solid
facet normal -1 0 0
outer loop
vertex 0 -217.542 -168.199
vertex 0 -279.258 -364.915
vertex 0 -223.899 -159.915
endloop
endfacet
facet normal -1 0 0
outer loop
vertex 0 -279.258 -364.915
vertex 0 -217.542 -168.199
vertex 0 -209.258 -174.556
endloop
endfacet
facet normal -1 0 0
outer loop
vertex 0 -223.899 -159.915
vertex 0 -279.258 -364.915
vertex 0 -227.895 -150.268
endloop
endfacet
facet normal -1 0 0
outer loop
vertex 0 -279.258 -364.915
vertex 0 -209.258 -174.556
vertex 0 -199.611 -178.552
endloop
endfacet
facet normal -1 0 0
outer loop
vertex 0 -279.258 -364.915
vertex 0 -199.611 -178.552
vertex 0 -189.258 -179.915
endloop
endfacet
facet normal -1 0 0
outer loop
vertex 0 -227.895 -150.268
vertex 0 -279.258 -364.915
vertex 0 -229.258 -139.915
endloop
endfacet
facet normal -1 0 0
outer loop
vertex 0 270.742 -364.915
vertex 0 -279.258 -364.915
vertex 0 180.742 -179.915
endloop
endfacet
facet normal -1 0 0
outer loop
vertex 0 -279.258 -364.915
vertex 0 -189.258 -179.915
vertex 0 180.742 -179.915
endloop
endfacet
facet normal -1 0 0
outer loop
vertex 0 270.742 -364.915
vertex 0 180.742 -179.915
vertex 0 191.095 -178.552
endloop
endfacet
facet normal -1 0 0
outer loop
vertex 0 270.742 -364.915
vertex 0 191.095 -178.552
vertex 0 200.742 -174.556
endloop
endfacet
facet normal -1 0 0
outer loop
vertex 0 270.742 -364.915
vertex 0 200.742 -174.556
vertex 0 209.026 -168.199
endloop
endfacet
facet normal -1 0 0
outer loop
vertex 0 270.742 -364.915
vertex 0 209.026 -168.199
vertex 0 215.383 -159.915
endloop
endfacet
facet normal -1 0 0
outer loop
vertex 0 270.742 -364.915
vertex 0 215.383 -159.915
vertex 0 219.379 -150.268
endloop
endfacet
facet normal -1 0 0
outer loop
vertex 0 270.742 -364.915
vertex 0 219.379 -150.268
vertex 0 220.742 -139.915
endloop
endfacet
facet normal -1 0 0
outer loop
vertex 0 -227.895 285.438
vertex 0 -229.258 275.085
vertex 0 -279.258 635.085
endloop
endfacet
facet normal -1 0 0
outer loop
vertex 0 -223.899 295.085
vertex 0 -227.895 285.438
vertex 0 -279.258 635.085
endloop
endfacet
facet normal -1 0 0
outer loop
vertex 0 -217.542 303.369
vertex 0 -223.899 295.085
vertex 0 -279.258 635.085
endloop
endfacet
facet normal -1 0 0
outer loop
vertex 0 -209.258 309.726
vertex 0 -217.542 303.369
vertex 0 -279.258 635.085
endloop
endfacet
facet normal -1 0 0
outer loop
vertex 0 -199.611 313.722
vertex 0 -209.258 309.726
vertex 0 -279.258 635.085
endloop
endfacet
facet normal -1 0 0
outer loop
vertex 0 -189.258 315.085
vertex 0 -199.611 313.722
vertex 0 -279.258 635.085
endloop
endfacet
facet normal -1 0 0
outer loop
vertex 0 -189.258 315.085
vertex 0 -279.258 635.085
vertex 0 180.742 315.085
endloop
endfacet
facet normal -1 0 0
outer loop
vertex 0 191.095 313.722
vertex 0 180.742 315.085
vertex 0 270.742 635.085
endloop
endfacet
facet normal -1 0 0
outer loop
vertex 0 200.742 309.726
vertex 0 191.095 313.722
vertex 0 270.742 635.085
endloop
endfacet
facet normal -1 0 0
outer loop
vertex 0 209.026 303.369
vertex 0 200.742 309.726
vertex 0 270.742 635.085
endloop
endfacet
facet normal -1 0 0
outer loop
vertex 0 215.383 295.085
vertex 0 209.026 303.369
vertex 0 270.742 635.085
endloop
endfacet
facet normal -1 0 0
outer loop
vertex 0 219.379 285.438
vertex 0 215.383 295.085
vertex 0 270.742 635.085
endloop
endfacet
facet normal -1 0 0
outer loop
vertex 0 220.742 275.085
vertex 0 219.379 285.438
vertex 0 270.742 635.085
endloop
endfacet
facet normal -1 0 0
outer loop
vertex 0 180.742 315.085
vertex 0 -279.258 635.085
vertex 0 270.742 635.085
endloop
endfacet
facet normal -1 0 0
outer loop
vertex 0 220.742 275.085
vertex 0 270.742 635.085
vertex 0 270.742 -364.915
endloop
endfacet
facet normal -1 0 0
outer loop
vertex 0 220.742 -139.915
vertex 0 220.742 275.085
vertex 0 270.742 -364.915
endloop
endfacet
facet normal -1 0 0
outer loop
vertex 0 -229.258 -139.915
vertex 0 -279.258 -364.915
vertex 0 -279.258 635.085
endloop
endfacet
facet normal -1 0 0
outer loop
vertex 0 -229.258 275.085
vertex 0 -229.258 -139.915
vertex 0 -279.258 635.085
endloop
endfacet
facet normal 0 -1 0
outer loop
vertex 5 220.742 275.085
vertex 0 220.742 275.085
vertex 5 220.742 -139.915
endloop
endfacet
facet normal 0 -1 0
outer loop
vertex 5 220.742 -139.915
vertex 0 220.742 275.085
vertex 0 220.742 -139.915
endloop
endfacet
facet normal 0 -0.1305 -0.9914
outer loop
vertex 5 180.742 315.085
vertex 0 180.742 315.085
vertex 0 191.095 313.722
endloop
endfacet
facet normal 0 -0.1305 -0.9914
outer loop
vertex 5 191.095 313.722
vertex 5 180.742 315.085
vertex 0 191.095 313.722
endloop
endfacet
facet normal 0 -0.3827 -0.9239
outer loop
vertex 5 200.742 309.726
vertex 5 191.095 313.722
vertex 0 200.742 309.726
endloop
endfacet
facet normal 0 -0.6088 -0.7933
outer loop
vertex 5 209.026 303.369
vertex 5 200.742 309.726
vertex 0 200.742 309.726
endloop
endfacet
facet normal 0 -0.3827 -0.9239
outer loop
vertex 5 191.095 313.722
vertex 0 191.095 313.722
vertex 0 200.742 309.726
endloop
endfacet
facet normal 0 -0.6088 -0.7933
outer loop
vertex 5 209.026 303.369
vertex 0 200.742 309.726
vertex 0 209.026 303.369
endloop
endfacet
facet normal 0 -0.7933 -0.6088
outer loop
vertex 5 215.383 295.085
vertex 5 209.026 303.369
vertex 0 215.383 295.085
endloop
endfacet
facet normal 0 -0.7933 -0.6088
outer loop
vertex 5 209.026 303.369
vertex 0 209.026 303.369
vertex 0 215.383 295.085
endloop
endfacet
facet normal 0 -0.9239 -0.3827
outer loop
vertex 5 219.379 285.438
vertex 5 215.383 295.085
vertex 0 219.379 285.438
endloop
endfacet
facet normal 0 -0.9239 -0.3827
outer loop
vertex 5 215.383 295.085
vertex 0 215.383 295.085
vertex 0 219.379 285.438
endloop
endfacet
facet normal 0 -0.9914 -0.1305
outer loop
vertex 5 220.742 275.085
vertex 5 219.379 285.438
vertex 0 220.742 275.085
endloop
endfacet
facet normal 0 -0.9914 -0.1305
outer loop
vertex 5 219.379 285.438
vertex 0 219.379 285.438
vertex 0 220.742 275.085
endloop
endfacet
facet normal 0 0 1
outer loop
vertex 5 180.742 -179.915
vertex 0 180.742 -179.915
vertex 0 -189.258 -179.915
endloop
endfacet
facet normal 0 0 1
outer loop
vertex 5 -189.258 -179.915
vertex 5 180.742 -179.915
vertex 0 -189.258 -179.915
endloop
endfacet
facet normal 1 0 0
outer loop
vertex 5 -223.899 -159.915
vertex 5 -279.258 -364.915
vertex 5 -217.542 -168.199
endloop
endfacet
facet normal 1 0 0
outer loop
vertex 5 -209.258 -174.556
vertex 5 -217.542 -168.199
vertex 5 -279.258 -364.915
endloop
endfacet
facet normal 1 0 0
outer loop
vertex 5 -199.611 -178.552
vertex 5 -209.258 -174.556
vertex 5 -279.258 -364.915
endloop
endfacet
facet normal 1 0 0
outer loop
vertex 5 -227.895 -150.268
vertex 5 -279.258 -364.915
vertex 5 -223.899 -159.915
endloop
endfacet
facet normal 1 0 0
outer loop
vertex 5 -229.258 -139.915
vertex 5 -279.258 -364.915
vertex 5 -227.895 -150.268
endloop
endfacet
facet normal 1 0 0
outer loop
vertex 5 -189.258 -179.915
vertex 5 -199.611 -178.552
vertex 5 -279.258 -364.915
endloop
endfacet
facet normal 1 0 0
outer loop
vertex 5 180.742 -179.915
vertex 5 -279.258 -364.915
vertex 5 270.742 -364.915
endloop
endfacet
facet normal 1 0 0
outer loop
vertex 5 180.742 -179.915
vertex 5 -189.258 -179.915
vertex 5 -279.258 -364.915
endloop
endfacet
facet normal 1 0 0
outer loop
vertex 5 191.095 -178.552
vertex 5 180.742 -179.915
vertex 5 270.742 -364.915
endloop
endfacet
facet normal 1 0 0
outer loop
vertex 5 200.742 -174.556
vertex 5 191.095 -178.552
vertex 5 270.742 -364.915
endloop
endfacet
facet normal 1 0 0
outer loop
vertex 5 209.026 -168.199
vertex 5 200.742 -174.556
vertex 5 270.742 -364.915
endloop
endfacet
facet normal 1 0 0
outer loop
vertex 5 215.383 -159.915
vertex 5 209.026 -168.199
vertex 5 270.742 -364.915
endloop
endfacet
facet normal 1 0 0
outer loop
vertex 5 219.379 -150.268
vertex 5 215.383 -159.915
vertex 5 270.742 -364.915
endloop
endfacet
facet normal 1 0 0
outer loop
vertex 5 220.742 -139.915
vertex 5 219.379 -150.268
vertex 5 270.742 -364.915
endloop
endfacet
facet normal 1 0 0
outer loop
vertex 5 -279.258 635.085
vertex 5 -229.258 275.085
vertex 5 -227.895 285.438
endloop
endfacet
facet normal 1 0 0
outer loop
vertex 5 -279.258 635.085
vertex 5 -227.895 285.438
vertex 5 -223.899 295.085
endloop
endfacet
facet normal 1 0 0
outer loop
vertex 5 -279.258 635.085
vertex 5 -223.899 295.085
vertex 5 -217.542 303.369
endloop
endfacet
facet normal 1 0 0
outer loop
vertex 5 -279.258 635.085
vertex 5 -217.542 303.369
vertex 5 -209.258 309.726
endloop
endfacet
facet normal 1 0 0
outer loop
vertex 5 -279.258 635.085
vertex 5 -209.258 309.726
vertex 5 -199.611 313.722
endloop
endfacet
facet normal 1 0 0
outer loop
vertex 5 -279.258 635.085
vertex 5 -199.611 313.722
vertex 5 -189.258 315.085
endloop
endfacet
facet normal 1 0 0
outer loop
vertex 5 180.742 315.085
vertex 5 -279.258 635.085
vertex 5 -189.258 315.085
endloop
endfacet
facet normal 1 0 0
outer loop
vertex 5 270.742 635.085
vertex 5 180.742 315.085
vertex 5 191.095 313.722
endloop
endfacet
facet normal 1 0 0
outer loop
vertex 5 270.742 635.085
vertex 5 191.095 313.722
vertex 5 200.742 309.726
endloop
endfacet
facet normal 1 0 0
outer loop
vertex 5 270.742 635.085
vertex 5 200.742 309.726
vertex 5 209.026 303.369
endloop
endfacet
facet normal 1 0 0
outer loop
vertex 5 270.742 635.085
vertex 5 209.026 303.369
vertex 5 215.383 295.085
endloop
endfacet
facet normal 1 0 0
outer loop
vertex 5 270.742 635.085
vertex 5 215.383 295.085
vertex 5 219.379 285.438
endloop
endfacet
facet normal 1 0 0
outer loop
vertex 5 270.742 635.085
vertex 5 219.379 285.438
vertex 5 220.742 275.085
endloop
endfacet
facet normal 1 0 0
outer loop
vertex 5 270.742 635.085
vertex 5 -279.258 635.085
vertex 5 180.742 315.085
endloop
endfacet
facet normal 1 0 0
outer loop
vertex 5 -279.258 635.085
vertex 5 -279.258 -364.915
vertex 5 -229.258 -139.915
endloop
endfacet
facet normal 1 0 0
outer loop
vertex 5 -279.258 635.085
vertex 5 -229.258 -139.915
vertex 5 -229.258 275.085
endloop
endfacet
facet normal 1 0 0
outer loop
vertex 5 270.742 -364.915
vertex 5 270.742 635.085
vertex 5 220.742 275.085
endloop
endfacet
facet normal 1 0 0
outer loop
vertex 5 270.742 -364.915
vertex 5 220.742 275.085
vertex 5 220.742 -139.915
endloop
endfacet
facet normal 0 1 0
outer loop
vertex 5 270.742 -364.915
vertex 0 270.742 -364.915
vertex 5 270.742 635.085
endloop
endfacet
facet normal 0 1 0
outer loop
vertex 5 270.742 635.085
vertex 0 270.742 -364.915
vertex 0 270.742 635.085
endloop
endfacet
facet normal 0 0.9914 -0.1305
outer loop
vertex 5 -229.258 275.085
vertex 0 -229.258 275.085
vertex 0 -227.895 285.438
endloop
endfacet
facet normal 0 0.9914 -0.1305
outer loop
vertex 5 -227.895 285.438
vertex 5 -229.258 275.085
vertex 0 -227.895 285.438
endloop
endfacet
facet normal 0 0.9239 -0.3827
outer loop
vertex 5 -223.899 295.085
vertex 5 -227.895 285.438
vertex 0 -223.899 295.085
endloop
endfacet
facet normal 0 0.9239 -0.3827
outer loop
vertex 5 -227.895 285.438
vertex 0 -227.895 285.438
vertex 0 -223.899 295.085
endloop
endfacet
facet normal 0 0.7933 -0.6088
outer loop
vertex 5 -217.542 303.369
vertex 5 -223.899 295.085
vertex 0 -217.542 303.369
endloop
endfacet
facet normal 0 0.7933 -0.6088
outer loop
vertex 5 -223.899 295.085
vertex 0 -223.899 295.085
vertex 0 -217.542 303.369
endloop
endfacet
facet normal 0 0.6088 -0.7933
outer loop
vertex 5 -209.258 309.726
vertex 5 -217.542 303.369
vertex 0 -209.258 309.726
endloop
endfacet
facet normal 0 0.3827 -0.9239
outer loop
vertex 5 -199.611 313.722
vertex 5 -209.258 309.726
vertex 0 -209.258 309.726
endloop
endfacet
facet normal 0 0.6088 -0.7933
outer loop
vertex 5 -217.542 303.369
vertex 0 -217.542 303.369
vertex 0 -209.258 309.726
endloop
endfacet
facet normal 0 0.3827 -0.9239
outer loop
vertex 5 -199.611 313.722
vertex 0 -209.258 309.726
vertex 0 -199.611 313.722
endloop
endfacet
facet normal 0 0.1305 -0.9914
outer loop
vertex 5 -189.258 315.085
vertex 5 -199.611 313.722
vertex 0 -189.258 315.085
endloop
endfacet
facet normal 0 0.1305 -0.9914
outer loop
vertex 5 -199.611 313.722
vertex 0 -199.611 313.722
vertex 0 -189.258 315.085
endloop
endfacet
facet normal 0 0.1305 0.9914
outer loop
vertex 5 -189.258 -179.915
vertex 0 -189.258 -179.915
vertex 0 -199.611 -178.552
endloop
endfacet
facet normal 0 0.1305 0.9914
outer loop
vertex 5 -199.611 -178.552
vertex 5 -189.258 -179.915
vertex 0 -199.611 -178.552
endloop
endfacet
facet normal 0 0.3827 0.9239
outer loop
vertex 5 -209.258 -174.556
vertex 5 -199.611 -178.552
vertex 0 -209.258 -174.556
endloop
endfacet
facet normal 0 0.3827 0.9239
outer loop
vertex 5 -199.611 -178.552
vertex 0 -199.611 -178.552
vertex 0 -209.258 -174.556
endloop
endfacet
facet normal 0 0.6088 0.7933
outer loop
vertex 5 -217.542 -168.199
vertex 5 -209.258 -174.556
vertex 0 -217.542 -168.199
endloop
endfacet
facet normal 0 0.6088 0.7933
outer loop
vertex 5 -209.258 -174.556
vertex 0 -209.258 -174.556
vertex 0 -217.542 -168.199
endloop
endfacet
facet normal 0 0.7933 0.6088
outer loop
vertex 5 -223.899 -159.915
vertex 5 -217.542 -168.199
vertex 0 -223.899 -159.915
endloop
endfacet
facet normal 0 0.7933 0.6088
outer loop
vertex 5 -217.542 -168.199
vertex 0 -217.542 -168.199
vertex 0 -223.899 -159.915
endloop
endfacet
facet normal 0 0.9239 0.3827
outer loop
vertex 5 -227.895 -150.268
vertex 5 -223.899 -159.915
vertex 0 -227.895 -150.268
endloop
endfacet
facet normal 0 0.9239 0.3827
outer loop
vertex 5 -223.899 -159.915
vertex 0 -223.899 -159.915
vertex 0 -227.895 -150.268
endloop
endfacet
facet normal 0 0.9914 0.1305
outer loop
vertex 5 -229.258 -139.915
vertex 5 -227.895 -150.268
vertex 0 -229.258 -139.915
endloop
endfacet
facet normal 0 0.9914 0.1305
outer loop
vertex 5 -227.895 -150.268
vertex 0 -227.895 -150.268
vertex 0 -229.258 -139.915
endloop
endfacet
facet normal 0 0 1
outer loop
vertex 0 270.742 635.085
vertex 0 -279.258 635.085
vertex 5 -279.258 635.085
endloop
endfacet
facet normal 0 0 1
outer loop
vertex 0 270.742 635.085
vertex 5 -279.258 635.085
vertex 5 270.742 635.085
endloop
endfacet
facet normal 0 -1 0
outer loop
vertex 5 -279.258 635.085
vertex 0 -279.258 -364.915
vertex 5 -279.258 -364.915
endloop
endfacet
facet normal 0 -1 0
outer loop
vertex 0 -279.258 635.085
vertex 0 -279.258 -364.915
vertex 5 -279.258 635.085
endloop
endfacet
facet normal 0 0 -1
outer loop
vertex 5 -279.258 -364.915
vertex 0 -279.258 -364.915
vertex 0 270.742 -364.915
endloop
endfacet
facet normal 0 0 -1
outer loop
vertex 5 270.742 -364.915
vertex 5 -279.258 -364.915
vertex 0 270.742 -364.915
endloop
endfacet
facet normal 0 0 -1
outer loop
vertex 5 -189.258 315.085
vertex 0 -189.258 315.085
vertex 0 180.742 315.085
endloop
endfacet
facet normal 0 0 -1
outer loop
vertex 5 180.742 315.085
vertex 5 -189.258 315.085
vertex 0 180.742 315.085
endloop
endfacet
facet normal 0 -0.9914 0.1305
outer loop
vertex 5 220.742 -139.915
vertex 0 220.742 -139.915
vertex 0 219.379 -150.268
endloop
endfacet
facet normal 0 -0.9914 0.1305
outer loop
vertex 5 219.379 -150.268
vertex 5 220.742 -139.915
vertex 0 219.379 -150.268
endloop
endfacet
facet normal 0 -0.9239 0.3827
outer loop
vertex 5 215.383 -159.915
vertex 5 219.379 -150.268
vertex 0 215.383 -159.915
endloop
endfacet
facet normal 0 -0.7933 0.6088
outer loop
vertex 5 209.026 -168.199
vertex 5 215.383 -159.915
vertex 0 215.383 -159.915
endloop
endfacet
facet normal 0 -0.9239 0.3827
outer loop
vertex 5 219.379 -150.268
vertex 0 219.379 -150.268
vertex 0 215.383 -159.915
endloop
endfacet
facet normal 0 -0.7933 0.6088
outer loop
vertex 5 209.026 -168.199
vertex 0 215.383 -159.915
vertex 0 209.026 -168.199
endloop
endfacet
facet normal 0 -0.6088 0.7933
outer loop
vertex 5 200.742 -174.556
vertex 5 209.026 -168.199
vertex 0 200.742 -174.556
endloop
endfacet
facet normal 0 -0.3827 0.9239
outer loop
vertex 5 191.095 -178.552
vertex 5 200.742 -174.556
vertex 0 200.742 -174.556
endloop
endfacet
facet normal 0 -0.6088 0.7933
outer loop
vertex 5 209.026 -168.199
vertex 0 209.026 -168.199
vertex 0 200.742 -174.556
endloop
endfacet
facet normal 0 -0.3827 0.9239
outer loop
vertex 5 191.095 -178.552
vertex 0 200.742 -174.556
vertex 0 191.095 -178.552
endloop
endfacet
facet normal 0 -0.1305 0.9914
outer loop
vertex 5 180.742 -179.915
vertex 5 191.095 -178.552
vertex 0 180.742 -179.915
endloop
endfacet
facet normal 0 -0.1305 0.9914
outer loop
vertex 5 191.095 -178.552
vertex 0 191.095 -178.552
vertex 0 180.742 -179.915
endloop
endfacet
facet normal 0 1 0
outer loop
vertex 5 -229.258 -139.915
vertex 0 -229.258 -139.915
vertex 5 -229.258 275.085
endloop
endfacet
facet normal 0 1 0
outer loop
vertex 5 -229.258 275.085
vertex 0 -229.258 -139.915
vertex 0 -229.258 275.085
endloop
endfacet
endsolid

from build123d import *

# Parameters (mm, degrees)
F0_W     = 550
F0_H     = 595
F1_DEPTH = 5
F0_H_2   = 270
F2_DEPTH = 5
F0_H_3   = 135
F3_DEPTH = 5


with BuildPart() as f1:
    # F0 (on Right) → F1 (new body)
    with BuildSketch(Plane.YZ):
        with Locations((-4.257952, 67.584985)):
            Rectangle(F0_W, F0_H)
        with BuildLine():
            ThreePointArc((-229.257952, 275.084985), (-217.542223, 303.369257), (-189.257952, 315.084985))
            Line((-189.257952, 315.084985), (-4.257952, 315.084985))
            Line((-4.257952, 315.084985), (180.742048, 315.084985))
            ThreePointArc((180.742048, 315.084985), (209.026319, 303.369257), (220.742048, 275.084985))
            Line((220.742048, 275.084985), (220.742048, 67.584985))
            Line((220.742048, 67.584985), (220.742048, -139.915015))
            ThreePointArc((220.742048, -139.915015), (209.026319, -168.199286), (180.742048, -179.915015))
            Line((180.742048, -179.915015), (-4.257952, -179.915015))
            Line((-4.257952, -179.915015), (-189.257952, -179.915015))
            ThreePointArc((-189.257952, -179.915015), (-217.542223, -168.199286), (-229.257952, -139.915015))
            Line((-229.257952, -139.915015), (-229.257952, 67.584985))
            Line((-229.257952, 67.584985), (-229.257952, 275.084985))
        make_face(mode=Mode.SUBTRACT)
    extrude(amount=F1_DEPTH)

    # F0 (on Right) → F2 (join)
    with BuildSketch(Plane.YZ):
        with Locations((-4.257952, 500.084985)):
            Rectangle(F0_W, F0_H_2)
    extrude(amount=F2_DEPTH)

    # F0 (on Right) → F3 (join)
    with BuildSketch(Plane.YZ):
        with Locations((-4.257952, -297.415015)):
            Rectangle(F0_W, F0_H_3)
    extrude(amount=F3_DEPTH)


solid = f1.part
